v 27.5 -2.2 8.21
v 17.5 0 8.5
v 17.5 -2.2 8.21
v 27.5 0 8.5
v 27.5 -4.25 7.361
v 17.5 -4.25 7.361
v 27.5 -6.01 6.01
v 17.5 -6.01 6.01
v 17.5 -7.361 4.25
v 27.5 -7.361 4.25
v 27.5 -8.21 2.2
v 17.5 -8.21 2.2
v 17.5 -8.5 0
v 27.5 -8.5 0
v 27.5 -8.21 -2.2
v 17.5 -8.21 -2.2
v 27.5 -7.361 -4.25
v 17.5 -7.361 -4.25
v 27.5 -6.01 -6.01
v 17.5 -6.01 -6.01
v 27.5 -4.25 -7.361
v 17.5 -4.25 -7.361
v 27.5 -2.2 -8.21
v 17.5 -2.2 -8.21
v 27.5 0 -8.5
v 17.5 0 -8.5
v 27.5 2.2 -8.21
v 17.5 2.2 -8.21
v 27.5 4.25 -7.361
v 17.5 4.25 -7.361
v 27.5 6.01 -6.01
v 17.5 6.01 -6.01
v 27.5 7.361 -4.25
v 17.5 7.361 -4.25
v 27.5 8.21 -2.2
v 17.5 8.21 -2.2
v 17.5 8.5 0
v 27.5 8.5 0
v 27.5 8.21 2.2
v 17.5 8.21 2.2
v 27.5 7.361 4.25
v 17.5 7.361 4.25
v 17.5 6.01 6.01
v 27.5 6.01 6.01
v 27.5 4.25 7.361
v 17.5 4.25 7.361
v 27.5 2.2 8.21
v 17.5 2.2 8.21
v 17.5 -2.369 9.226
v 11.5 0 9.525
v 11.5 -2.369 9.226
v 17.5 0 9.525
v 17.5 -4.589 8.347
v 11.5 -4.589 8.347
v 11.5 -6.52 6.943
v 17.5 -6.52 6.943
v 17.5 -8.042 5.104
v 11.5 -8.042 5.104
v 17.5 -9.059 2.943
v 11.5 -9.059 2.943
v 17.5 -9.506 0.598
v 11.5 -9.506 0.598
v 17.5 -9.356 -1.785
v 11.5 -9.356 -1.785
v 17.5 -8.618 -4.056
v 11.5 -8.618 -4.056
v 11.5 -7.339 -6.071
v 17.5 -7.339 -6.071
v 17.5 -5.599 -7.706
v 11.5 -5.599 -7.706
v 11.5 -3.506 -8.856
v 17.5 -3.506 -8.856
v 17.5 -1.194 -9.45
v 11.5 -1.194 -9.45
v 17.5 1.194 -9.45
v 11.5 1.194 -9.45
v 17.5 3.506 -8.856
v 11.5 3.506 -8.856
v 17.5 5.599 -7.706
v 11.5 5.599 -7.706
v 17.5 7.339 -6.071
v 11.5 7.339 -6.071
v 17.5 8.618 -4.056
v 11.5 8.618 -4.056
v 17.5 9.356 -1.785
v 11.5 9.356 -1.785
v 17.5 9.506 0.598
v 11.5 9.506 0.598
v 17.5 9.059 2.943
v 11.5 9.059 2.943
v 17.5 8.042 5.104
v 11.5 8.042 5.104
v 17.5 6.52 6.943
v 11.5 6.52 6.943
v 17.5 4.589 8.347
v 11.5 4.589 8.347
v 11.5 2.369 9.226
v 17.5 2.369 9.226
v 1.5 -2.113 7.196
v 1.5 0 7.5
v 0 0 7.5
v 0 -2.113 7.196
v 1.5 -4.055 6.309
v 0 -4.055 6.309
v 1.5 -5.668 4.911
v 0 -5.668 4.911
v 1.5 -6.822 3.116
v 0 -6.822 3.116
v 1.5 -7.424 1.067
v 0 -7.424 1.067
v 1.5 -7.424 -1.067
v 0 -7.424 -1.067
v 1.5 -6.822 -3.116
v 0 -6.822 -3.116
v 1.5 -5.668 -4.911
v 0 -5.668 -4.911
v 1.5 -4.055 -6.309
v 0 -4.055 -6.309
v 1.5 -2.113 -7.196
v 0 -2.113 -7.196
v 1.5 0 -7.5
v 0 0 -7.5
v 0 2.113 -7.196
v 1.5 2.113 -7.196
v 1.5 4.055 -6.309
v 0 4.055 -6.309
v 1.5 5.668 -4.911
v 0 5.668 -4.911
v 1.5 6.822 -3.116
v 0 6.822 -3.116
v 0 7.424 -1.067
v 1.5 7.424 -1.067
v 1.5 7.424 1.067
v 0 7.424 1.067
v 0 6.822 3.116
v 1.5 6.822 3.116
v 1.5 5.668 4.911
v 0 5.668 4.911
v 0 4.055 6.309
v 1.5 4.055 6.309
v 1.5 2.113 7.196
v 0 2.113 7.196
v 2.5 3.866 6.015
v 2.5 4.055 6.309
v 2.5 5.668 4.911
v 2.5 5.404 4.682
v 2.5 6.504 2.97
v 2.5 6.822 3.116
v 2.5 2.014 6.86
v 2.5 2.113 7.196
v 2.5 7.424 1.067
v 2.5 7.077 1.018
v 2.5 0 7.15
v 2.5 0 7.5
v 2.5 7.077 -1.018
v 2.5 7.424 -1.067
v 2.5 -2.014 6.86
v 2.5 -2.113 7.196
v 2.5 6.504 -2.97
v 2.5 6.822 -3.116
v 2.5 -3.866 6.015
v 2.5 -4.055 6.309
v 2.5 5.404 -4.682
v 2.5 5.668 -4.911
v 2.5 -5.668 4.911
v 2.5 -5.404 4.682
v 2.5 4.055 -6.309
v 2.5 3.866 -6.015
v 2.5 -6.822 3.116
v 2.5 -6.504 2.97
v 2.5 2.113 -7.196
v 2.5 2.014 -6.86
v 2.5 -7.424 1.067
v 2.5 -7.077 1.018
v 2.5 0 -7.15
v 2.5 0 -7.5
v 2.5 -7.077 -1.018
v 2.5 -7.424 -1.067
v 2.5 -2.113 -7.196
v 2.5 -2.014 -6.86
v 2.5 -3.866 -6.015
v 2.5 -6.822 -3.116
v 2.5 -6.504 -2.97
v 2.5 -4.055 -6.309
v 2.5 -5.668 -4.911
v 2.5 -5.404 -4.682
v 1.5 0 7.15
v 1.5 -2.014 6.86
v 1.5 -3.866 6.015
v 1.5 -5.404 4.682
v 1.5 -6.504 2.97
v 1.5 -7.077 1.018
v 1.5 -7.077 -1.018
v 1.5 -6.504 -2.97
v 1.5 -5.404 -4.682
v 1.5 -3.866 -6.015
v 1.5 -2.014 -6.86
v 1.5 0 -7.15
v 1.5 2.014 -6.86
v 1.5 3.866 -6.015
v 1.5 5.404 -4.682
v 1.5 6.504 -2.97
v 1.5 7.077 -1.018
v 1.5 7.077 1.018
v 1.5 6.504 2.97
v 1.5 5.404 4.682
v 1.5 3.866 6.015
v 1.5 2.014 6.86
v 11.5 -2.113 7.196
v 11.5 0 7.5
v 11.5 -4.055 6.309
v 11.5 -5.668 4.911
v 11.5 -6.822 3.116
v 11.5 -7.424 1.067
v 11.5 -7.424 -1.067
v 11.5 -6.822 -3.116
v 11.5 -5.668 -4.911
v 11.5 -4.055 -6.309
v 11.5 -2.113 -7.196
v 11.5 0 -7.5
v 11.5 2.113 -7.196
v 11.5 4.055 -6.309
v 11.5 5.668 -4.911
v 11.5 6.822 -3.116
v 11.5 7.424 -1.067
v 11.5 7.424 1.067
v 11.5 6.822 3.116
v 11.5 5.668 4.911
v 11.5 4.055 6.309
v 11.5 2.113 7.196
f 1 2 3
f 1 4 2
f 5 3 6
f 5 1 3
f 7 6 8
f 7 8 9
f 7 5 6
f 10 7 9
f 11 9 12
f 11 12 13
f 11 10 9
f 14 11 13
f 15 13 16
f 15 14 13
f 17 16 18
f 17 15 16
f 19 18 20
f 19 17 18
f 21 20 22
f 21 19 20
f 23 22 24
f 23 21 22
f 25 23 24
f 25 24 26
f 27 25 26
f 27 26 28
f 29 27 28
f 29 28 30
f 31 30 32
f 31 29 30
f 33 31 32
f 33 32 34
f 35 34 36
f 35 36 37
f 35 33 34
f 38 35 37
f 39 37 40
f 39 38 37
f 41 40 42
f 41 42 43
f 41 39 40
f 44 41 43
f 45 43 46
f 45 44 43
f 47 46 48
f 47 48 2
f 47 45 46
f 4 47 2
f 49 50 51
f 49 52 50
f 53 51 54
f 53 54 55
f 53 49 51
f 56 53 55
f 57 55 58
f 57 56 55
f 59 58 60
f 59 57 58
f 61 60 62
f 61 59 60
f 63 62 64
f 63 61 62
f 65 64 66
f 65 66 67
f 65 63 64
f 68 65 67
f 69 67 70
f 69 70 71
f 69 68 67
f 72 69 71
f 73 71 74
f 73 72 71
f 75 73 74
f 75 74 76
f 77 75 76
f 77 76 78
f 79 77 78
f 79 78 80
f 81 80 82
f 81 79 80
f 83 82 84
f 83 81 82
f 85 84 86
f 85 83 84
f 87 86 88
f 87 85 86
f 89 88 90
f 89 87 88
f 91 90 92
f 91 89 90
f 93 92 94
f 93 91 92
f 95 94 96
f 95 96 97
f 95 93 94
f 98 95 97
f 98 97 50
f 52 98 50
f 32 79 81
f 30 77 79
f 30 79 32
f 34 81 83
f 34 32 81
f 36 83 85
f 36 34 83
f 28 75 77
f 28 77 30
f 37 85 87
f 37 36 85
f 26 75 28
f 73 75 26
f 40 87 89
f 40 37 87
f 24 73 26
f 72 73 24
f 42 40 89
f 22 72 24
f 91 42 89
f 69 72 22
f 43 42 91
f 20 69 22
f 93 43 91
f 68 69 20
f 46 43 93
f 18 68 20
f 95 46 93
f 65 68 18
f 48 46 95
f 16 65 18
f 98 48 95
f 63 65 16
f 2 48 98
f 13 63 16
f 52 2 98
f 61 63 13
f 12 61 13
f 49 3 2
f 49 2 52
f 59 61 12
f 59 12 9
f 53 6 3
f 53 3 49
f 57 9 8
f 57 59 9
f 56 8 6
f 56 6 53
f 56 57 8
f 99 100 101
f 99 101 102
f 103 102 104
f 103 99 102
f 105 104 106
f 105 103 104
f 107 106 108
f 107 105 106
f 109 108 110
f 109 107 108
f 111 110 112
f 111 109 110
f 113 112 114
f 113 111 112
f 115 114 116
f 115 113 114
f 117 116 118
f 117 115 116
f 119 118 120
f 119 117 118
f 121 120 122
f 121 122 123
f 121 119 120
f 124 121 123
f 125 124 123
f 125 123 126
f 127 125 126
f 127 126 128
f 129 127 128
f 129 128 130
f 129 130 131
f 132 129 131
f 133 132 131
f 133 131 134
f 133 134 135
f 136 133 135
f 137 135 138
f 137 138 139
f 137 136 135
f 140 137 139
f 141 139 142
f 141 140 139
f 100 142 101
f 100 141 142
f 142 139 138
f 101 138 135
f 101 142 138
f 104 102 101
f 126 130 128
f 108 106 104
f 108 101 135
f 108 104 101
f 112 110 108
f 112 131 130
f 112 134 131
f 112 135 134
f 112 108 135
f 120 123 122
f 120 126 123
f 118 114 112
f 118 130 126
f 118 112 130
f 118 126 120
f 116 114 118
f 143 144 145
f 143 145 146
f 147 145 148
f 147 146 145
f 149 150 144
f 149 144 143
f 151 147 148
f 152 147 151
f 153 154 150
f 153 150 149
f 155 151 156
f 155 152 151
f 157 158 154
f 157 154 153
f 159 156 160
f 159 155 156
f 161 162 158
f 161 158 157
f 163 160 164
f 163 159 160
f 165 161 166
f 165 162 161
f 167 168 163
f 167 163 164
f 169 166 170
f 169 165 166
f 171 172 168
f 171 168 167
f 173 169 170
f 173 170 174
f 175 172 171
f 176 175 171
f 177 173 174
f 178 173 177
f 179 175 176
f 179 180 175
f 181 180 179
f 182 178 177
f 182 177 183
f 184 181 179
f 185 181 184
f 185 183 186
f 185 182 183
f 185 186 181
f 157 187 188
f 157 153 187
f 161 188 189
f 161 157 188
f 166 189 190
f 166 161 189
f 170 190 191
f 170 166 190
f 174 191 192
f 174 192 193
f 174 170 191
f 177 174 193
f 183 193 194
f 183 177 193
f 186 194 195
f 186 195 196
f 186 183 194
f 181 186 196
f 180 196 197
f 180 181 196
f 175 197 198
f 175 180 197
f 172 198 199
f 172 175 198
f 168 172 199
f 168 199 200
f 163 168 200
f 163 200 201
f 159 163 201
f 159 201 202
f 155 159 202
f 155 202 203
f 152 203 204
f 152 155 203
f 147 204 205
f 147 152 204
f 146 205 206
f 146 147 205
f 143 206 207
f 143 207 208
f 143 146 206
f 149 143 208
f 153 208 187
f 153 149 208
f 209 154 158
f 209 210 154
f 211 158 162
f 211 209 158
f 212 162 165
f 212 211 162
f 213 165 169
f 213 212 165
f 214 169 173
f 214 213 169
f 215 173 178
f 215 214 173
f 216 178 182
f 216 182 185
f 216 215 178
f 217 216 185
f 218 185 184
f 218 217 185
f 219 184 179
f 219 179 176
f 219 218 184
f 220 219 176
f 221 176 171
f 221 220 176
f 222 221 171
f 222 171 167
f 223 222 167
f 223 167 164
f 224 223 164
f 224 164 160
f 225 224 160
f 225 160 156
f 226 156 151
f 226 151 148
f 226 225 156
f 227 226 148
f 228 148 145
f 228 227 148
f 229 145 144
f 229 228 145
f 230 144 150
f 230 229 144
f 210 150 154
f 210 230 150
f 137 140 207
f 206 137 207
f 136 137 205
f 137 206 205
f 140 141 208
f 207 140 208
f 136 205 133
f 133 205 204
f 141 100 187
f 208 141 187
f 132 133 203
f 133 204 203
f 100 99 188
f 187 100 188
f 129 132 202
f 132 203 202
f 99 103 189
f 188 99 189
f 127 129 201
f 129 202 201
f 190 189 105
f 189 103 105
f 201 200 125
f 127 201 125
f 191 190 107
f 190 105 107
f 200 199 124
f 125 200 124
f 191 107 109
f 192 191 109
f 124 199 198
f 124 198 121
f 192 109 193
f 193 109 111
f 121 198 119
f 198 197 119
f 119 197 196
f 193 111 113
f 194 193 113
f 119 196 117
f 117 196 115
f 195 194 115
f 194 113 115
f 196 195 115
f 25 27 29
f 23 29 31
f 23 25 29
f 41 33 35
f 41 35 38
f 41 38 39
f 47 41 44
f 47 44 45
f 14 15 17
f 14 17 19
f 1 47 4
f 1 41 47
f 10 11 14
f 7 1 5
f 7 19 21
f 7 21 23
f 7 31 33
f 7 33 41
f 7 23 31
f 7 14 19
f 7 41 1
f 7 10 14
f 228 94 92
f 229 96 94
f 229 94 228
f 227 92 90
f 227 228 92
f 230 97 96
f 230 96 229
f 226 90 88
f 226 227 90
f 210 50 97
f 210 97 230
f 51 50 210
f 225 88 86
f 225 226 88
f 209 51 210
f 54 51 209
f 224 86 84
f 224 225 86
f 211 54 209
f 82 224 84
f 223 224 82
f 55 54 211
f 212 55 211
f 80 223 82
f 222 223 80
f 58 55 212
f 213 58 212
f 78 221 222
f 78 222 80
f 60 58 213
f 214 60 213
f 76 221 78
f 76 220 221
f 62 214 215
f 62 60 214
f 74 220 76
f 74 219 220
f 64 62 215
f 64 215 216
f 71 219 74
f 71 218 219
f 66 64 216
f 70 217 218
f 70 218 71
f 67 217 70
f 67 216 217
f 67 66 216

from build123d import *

# Parameters (mm, degrees)
ESBO_O2_W = 1
ESBO_O2_H = 0.35


with BuildPart() as part:
    # Esboço1 → Revolução1 (revolve)
    with BuildSketch(Plane.XY, mode=Mode.PRIVATE) as revolu_o1_sk:
        Polygon((0, 0), (0, 7.5), (11.5, 7.5), (11.5, 9.525), (17.5, 9.525), (17.5, 8.5), (27.5, 8.5), (27.5, 0), align=None)
    revolve(revolu_o1_sk.sketch.rotate(Axis((0, 0, 0), (1, 0, 0)), 90), axis=Axis((0, 0, 0), (1, 0, 0)))

    # Esboço2 → Corte-Revolução1 (revolve, cut)
    with BuildSketch(Plane.XY, mode=Mode.PRIVATE) as corte_revolu_o1_sk:
        with Locations((2, 7.325)):
            Rectangle(ESBO_O2_W, ESBO_O2_H)
    revolve(corte_revolu_o1_sk.sketch.rotate(Axis((0, 0, 0), (1, 0, 0)), 90), axis=Axis((0, 0, 0), (1, 0, 0)), mode=Mode.SUBTRACT)


solid = part.part
